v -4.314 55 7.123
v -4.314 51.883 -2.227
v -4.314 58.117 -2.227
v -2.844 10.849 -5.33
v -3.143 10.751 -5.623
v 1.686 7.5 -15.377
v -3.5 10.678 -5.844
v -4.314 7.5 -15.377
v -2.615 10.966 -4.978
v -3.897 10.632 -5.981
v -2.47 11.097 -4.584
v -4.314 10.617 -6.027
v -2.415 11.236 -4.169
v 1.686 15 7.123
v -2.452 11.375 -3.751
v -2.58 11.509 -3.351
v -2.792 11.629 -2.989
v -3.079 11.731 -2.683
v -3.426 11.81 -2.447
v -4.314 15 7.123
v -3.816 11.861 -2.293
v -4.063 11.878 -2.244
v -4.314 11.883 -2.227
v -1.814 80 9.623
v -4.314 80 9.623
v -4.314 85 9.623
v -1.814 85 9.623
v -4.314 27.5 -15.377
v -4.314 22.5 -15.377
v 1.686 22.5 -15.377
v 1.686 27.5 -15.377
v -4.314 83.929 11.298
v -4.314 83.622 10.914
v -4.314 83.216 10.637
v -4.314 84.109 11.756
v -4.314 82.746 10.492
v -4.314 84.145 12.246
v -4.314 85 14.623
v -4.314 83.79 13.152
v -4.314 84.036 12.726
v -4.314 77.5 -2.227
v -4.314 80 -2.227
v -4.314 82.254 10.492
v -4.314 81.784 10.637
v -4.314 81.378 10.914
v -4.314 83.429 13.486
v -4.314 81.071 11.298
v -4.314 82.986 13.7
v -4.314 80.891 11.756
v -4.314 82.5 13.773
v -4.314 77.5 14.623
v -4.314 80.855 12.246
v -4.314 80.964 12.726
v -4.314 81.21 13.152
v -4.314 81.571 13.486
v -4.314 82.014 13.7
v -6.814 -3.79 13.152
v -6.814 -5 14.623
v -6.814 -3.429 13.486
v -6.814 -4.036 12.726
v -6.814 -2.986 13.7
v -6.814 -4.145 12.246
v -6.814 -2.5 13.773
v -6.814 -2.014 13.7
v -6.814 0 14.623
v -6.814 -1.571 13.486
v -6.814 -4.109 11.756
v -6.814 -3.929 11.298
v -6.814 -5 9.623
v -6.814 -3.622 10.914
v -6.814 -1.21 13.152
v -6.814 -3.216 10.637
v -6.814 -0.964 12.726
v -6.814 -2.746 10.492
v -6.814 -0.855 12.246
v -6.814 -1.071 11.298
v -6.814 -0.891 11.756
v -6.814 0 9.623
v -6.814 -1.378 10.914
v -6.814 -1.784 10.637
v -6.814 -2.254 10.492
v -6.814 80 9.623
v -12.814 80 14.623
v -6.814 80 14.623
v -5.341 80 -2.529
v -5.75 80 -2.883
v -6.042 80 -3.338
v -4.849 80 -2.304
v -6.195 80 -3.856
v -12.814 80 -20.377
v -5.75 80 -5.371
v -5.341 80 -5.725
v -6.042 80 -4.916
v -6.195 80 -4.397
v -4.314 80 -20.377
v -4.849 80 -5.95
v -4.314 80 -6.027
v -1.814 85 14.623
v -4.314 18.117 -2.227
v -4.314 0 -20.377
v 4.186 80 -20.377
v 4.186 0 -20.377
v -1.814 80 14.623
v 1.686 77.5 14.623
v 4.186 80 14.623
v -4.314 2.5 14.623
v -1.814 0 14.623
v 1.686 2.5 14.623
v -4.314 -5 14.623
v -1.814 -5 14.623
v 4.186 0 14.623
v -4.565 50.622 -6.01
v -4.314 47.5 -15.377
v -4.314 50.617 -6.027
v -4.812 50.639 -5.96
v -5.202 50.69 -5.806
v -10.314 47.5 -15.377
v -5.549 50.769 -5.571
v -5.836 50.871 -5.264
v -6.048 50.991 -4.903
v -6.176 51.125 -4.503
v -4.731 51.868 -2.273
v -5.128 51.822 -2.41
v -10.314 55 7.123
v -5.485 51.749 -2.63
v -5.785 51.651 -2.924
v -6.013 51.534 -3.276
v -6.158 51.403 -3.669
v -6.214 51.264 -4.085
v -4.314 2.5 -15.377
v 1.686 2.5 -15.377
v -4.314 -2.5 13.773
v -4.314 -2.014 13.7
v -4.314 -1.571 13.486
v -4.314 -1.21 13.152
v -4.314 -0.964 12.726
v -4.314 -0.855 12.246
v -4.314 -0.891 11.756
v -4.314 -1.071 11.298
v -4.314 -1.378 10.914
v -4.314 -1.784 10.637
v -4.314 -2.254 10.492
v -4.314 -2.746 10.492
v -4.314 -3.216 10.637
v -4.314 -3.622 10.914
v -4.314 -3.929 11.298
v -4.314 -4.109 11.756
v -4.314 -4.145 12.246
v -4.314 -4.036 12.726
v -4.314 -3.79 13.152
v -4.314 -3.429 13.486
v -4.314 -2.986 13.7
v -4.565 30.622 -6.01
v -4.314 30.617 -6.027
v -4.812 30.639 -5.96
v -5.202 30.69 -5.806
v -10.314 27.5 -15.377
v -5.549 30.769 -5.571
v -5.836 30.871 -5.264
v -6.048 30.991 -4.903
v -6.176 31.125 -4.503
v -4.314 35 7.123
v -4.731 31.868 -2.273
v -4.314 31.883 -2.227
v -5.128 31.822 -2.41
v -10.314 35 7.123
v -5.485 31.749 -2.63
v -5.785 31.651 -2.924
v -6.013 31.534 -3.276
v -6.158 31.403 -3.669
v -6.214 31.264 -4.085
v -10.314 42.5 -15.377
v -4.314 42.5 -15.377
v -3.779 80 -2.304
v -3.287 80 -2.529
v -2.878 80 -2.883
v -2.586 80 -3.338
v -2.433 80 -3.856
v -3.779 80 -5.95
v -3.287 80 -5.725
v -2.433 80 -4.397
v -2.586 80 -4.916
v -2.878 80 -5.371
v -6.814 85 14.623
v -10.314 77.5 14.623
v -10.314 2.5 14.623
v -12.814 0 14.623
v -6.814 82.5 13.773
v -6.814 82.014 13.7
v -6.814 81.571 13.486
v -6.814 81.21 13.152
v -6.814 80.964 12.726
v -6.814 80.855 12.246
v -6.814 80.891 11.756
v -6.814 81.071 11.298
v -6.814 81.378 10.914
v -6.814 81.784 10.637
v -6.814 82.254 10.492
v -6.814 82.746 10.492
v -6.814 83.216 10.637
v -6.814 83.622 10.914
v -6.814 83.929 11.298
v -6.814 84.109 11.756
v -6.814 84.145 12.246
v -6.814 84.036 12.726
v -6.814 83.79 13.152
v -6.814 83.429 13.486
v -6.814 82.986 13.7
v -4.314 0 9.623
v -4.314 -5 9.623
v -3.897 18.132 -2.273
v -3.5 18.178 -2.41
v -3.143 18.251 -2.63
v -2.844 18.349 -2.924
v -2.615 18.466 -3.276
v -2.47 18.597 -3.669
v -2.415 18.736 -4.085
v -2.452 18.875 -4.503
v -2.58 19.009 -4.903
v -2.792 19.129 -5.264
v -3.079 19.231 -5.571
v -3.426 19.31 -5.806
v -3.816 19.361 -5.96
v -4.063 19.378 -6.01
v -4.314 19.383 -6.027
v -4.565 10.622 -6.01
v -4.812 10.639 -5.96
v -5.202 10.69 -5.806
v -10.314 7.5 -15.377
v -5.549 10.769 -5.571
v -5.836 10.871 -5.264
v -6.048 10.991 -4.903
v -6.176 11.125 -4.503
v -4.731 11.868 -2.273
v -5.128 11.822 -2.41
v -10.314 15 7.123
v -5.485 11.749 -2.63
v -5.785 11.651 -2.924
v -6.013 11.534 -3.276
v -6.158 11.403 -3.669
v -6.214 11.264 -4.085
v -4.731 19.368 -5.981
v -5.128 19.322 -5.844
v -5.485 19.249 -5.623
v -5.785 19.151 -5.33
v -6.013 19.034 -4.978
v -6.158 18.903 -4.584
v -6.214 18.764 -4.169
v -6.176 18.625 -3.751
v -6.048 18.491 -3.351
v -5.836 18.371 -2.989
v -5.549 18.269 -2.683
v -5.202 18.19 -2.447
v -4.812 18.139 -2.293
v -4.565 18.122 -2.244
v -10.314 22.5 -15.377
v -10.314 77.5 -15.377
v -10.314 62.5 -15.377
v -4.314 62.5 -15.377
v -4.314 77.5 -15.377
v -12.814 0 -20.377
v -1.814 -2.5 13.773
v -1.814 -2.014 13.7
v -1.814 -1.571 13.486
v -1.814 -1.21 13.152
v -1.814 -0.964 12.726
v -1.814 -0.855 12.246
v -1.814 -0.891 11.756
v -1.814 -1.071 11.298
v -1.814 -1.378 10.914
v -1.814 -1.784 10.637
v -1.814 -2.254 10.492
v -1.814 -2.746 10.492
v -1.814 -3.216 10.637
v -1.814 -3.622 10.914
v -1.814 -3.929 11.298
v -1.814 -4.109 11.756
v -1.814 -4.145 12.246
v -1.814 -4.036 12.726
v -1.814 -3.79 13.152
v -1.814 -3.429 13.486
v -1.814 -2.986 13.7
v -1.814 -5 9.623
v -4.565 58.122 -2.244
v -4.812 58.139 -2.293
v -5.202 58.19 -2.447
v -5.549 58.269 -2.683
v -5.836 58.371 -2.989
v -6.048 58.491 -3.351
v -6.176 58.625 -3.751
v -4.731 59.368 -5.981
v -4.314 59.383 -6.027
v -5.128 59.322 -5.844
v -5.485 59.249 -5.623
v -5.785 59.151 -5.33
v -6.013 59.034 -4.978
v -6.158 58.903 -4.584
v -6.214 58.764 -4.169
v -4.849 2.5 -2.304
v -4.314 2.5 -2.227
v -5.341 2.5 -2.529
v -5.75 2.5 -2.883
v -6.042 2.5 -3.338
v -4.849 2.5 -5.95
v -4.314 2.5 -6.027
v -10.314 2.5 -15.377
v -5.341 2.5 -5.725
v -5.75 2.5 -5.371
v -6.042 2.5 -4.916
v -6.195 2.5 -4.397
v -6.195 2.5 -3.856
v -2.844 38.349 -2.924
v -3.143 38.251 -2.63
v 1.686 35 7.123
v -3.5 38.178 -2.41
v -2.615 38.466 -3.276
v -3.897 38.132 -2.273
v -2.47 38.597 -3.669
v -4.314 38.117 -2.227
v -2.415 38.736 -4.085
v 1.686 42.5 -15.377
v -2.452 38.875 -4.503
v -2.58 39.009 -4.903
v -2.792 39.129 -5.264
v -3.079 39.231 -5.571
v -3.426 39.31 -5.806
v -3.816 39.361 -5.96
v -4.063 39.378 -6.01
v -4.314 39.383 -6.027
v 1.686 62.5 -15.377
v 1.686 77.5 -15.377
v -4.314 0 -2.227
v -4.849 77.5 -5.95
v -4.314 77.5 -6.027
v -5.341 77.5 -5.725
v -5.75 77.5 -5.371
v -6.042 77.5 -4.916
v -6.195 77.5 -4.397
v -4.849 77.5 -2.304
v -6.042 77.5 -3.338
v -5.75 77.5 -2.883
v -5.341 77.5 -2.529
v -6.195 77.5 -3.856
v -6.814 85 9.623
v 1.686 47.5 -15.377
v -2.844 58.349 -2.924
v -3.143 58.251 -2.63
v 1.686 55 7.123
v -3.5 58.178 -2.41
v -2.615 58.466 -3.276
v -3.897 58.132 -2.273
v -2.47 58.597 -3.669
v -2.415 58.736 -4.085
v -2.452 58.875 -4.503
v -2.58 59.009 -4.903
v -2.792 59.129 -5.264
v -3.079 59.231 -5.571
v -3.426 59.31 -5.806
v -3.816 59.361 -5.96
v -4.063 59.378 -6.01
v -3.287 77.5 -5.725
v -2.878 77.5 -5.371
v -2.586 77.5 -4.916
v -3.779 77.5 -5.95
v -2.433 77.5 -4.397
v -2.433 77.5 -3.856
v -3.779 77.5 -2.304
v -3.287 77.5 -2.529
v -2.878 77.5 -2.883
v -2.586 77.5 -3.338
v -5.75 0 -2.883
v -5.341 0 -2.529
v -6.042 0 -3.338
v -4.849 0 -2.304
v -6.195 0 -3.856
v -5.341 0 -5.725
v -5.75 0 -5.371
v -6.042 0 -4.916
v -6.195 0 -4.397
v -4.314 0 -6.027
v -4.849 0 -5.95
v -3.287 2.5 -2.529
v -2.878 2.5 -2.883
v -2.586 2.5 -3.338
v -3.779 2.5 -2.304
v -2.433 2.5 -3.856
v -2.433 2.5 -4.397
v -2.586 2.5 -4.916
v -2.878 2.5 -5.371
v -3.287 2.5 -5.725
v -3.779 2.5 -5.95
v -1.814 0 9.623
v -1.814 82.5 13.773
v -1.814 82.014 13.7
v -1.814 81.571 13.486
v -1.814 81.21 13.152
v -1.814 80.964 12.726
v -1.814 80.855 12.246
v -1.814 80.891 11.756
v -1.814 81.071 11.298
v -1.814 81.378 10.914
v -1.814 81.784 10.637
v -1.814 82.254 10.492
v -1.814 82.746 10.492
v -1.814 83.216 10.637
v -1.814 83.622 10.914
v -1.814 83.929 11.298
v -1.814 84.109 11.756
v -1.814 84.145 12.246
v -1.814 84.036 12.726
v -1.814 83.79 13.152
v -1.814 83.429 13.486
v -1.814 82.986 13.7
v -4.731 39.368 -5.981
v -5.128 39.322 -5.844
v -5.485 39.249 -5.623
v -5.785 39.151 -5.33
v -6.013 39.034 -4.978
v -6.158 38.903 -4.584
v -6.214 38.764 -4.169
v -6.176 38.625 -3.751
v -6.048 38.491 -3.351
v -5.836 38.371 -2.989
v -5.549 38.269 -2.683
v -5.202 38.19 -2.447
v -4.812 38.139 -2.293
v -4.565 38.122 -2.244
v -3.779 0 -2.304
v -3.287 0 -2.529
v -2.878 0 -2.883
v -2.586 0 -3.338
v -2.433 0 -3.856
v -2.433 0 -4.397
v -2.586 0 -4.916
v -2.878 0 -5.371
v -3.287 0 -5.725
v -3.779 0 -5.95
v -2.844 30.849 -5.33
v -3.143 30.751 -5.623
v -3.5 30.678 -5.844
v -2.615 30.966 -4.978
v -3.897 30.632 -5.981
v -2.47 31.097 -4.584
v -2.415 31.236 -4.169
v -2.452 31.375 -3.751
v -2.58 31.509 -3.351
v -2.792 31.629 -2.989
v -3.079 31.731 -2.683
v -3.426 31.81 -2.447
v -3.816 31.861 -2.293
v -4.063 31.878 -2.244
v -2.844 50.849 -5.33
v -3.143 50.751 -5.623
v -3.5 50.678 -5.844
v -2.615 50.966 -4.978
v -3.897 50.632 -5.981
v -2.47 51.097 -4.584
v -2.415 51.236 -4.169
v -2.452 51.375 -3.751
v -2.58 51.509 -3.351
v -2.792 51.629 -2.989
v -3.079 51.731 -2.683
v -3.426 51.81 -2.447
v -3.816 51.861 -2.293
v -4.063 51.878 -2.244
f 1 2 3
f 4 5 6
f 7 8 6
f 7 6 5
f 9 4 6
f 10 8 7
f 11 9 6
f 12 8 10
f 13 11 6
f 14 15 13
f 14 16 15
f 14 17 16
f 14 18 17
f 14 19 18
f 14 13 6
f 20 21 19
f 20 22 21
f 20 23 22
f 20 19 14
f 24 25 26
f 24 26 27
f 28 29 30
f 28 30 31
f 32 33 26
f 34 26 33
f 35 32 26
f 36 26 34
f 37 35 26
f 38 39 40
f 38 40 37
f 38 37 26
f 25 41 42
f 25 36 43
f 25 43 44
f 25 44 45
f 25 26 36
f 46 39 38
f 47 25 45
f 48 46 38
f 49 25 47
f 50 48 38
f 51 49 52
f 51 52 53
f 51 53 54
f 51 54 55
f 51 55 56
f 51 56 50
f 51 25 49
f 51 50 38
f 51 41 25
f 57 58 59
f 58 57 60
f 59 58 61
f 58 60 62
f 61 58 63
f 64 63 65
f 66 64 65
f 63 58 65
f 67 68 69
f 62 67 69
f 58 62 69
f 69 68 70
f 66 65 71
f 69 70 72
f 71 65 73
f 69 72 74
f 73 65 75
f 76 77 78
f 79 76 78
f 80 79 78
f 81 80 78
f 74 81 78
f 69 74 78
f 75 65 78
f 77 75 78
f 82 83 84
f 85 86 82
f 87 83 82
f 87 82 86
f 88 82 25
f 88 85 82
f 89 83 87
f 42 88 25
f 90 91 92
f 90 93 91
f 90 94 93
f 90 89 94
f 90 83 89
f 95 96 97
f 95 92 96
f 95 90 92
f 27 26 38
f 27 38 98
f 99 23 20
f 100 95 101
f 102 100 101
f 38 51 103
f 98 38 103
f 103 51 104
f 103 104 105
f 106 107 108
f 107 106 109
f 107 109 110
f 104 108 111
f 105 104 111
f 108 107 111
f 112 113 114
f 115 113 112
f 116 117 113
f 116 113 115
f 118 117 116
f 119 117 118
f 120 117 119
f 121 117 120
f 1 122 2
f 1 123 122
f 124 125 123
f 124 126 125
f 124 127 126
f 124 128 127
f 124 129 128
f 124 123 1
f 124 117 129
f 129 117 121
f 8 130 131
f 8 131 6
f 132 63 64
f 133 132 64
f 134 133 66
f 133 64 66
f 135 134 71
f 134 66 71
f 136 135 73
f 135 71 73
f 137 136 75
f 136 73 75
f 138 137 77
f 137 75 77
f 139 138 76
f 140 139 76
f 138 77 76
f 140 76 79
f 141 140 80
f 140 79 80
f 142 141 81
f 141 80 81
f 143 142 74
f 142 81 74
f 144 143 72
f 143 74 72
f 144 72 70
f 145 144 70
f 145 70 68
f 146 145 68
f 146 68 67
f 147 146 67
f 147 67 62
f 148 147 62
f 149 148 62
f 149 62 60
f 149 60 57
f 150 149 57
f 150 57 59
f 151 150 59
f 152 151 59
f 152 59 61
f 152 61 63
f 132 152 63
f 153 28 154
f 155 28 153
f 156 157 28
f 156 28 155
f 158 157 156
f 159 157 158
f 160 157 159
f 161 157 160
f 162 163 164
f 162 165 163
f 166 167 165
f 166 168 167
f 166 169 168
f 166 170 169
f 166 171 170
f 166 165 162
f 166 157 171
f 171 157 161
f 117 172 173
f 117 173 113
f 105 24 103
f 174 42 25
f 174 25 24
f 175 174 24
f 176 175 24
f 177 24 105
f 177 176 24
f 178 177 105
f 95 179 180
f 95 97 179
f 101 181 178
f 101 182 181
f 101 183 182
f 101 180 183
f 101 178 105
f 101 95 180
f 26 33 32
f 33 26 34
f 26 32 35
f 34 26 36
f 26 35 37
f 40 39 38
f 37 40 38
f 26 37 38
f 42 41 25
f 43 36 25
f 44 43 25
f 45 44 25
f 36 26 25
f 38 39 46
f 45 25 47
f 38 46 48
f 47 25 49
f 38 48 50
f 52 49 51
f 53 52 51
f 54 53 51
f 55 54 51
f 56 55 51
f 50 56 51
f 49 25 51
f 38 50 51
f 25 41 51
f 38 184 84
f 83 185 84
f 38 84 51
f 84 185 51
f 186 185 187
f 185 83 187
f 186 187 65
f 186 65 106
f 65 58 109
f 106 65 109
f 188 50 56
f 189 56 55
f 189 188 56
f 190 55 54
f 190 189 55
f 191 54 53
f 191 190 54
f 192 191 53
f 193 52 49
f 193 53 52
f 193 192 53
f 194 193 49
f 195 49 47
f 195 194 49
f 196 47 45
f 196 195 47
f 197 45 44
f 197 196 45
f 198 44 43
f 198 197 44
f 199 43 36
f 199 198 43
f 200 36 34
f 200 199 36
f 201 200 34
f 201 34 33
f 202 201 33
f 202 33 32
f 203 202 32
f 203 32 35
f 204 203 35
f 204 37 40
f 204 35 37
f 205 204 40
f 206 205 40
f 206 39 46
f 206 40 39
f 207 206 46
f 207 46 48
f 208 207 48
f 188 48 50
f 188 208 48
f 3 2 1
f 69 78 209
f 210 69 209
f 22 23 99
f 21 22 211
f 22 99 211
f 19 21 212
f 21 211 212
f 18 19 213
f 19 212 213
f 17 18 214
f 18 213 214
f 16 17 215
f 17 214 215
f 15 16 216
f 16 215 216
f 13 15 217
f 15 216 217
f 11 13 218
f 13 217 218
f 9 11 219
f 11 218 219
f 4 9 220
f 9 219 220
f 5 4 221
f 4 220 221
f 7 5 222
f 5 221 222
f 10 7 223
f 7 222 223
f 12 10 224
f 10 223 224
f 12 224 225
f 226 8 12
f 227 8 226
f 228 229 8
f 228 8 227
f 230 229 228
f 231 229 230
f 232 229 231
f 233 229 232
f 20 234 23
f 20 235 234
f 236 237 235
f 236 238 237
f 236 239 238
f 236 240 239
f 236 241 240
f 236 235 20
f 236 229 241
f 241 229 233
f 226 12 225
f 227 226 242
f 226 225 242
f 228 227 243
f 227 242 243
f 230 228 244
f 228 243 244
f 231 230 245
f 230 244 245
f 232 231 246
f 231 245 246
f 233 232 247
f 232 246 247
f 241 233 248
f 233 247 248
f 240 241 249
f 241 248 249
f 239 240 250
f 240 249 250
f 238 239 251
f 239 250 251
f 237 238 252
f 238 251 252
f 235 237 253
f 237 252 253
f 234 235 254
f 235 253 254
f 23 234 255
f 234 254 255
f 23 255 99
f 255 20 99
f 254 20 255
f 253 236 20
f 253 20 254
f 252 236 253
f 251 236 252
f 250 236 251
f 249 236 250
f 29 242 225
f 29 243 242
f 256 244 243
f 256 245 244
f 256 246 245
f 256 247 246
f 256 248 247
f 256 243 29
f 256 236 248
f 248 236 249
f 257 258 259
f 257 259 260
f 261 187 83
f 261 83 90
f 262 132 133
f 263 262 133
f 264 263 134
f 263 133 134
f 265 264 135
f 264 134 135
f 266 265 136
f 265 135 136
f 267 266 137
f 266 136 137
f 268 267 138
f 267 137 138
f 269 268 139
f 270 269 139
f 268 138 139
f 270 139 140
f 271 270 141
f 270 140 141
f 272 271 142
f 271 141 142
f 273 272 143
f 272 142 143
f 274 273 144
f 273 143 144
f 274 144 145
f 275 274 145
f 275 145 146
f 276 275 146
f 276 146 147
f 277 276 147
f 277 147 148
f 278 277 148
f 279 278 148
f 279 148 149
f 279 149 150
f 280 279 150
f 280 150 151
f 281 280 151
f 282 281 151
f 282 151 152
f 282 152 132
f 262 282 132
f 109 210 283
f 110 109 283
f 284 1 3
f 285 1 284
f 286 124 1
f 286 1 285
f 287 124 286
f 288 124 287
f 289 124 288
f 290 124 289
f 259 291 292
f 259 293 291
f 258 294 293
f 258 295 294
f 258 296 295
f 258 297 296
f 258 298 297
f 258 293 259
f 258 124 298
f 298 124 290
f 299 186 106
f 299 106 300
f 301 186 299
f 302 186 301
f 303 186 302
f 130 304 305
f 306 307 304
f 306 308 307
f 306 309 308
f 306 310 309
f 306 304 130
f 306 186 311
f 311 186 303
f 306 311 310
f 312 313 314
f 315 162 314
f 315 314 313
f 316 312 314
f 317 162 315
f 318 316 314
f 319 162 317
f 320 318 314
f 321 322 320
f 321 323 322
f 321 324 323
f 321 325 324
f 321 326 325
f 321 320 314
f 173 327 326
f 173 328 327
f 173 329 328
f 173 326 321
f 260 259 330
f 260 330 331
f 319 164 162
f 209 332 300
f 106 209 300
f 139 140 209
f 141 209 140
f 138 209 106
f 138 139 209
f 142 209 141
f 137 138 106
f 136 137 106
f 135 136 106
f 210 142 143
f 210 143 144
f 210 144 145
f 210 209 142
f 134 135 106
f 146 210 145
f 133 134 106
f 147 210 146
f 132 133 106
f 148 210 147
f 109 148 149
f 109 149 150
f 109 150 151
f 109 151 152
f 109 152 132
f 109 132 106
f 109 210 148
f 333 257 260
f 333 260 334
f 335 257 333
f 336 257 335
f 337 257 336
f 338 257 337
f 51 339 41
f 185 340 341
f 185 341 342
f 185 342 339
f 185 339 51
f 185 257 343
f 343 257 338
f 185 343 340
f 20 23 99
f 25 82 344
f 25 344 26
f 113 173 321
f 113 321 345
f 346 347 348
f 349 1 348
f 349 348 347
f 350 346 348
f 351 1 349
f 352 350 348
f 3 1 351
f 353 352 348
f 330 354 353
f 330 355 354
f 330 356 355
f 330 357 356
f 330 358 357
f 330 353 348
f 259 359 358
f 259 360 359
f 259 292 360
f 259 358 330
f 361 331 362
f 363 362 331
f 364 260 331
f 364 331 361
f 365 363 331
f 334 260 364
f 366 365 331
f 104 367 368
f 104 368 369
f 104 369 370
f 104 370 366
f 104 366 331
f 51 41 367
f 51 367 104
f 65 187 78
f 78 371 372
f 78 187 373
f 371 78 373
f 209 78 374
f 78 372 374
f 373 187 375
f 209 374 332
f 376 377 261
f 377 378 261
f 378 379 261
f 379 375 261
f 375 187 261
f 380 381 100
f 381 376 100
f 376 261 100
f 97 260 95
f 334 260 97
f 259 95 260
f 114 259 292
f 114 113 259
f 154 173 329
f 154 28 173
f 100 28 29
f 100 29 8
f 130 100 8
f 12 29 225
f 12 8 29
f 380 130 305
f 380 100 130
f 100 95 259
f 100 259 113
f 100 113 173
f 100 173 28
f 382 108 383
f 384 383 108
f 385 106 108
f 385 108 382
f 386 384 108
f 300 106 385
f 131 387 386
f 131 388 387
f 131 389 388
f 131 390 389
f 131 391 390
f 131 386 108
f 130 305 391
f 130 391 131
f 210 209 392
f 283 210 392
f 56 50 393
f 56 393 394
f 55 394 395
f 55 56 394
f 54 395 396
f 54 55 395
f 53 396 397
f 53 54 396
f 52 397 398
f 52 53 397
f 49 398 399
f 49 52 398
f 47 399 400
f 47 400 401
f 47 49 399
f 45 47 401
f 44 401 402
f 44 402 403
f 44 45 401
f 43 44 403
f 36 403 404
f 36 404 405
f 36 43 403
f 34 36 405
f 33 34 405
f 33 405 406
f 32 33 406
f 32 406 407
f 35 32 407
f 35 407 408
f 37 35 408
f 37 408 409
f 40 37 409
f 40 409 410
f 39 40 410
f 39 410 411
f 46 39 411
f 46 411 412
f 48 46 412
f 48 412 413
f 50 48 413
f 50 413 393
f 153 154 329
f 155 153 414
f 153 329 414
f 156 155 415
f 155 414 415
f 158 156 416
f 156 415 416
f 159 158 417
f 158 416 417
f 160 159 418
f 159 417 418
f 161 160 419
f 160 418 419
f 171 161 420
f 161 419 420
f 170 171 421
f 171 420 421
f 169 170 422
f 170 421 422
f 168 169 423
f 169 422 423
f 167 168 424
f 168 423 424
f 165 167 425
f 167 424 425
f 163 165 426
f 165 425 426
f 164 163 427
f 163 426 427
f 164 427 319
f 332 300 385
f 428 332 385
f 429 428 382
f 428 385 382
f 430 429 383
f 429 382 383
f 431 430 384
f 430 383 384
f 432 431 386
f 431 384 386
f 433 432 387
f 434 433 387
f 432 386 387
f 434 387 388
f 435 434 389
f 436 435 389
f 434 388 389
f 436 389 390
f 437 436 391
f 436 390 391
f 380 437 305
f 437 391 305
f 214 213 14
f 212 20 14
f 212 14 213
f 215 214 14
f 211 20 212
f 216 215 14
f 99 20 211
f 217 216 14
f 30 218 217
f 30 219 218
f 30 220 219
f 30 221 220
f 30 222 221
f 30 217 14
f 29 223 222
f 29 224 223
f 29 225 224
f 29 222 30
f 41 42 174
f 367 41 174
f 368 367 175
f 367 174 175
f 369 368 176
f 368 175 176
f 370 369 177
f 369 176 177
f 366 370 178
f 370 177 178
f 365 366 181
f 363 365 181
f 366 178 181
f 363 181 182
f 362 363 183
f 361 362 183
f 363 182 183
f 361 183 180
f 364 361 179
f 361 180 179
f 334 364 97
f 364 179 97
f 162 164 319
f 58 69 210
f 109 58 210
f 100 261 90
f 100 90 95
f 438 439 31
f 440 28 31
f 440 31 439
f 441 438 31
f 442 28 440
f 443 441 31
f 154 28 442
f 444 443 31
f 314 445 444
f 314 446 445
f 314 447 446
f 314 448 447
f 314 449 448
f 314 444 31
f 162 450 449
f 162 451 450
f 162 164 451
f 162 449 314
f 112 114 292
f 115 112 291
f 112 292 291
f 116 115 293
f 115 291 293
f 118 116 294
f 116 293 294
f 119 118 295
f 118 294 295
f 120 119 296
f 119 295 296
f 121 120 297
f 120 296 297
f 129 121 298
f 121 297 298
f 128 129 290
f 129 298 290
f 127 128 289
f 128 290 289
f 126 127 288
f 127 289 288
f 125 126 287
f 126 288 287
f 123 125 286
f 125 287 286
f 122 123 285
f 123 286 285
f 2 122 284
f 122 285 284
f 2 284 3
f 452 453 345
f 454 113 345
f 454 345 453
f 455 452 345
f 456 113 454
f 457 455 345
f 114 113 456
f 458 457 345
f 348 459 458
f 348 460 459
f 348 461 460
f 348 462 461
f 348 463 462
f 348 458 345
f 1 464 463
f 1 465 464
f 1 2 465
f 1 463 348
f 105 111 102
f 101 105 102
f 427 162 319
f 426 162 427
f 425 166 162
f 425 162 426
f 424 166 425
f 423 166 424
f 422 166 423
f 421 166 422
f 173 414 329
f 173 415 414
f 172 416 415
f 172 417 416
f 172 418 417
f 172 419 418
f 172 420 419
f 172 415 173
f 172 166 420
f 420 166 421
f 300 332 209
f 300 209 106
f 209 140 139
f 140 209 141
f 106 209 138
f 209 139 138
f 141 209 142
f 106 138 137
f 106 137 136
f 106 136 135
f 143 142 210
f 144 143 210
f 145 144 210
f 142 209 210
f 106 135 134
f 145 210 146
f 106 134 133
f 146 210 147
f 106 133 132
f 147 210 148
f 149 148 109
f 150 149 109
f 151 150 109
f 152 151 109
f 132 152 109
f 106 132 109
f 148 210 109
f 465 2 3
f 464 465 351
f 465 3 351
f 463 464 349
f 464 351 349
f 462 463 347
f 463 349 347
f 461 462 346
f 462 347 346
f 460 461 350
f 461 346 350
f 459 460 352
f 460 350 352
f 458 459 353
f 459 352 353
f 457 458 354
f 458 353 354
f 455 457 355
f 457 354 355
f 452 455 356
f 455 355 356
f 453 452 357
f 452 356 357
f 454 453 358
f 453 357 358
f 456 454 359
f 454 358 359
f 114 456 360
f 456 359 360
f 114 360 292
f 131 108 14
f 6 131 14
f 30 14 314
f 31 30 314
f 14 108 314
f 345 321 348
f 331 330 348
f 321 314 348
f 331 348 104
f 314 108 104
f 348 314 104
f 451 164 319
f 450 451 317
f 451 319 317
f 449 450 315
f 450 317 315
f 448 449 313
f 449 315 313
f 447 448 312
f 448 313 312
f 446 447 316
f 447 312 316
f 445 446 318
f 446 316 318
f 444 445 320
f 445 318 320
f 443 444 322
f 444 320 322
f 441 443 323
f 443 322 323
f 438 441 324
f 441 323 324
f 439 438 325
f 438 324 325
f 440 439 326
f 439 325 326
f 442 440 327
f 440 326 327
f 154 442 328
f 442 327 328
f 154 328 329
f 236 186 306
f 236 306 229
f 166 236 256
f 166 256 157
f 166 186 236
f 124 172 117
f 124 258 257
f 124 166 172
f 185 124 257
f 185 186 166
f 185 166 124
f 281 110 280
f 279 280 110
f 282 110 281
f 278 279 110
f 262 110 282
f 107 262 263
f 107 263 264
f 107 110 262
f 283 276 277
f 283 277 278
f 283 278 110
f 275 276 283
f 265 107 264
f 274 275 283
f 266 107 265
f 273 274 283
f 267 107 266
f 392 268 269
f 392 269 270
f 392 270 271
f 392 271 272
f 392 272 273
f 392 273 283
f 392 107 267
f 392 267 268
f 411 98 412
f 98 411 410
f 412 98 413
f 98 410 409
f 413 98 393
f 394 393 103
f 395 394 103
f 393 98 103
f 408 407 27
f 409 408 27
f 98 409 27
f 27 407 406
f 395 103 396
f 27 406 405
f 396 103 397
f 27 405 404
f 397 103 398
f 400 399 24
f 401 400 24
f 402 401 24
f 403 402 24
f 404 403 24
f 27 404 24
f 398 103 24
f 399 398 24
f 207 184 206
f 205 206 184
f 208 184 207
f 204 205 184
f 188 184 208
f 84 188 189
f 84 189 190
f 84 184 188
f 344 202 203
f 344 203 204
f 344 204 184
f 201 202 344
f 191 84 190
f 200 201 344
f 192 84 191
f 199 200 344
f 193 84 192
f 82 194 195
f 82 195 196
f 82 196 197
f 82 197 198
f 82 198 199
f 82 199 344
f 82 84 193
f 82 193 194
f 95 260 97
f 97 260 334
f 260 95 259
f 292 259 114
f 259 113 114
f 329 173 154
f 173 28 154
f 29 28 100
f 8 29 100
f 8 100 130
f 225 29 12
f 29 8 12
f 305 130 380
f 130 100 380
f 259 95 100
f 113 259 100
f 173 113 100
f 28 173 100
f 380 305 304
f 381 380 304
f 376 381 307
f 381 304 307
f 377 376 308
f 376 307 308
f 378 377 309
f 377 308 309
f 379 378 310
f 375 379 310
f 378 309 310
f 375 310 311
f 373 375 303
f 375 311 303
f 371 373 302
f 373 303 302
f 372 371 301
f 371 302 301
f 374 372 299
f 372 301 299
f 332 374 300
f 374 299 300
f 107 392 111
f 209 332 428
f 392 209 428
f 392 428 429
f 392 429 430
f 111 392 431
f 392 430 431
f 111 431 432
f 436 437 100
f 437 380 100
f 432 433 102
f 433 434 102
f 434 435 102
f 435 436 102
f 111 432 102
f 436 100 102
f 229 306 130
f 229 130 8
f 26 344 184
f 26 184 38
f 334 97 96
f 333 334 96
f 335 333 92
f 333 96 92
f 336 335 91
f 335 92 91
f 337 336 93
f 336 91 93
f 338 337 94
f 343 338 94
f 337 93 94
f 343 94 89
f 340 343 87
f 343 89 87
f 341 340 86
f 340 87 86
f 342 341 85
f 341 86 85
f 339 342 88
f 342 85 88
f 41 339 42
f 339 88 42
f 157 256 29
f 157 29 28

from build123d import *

# Parameters (mm, degrees)
SKETCH1_W           = 17
SKETCH1_H           = 35
BOSS_EXTRUDE1_DEPTH = 80
CAVITY1_START       = -10.314070352
CAVITY1_DEPTH       = 12
SKETCH2_W           = 5
SKETCH2_H           = 5
BOSS_EXTRUDE2_DEPTH = 5
SKETCH3_R           = 1.65
CUT_EXTRUDE1_DEPTH  = 5
CUT_EXTRUDE2_REACH  = 90.343
SKETCH4_R           = 1.9


# Read off the part's stored shape, not the designer's step: Cavity1
with BuildPart() as part:
    # Sketch1 → Boss-Extrude1 (new body)
    with BuildSketch(Plane(origin=(0, 0, 0), x_dir=(1, 0, 0), z_dir=(0, 1, 0))):
        with Locations((-4.314070352, 2.876884422)):
            Rectangle(SKETCH1_W, SKETCH1_H)
    extrude(amount=BOSS_EXTRUDE1_DEPTH)

    # Cavity1 outline → Cavity1 (cut)
    with BuildSketch(Plane.YZ.offset(CAVITY1_START)):
        Polygon((42.5, -15.376884422), (47.5, -15.376884422), (55, 7.123115578), (62.5, -15.376884422), (77.5, -15.376884422), (77.5, 14.623115578), (2.5, 14.623115578), (2.5, -15.376884422), (7.5, -15.376884422), (15, 7.123115578), (22.5, -15.376884422), (27.5, -15.376884422), (35, 7.123115578), align=None)
    extrude(amount=CAVITY1_DEPTH, mode=Mode.SUBTRACT)

    # Sketch2 → Boss-Extrude2 (add)
    with BuildSketch(Plane(origin=(0, 0, 0), x_dir=(1, 0, 0), z_dir=(0, 1, 0))):
        with Locations((-4.314070352, -12.123115578)):
            Rectangle(SKETCH2_W, SKETCH2_H)
    boss_extrude2 = extrude(amount=-BOSS_EXTRUDE2_DEPTH)

    # Sketch3 → Cut-Extrude1 (cut)
    with BuildSketch(Plane.ZY.offset(6.814070352)):
        with Locations((12.123115578, -2.5)):
            Circle(SKETCH3_R)
    cut_extrude1 = extrude(amount=-CUT_EXTRUDE1_DEPTH, mode=Mode.SUBTRACT)

    # Cut-Extrude2: up to this face of the body (flat: up to its plane)
    cut_extrude2_end = Plane(part.part.faces().sort_by_distance((-4.314070352, 0, -3.534779159))[0])
    # Sketch4 → Cut-Extrude2 (cut, up to the picked face)
    with BuildSketch(Plane(origin=(0, 80, 0), x_dir=(1, 0, 0), z_dir=(0, 1, 0)), mode=Mode.PRIVATE) as cut_extrude2_sk1:
        with Locations(Location((-4.314070352, 4.126884422, 0), (0, 0, 270))):
            Circle(SKETCH4_R)
    cut_extrude2_tool1 = split(extrude(cut_extrude2_sk1.sketch, amount=-CUT_EXTRUDE2_REACH, mode=Mode.PRIVATE), bisect_by=cut_extrude2_end, keep=Keep.BOTH, mode=Mode.PRIVATE)
    add(cut_extrude2_tool1.solids().sort_by(Axis((-4.31407, 80, -4.126884), (0, -1, 0)))[0], mode=Mode.SUBTRACT)

    # Mirror1: Boss-Extrude2, Cut-Extrude1 across plane
    add(boss_extrude2.mirror(Plane.ZX.offset(40)))
    add(cut_extrude1.mirror(Plane.ZX.offset(40)), mode=Mode.SUBTRACT)


with BuildPart() as body_2:
    # Split1: the piece on the far side of the plane
    add(part.part)
    split(bisect_by=Plane(origin=(-4.314070352, 0, 0), x_dir=(0, 0, 1), z_dir=(1, 0, 0)), keep=Keep.BOTTOM)


with BuildPart() as part_1:
    add(part.part)

    # Split1
    split(bisect_by=Plane(origin=(-4.314070352, 0, 0), x_dir=(0, 0, 1), z_dir=(1, 0, 0)), keep=Keep.TOP)


solid = Compound([body_2.part, part_1.part])
